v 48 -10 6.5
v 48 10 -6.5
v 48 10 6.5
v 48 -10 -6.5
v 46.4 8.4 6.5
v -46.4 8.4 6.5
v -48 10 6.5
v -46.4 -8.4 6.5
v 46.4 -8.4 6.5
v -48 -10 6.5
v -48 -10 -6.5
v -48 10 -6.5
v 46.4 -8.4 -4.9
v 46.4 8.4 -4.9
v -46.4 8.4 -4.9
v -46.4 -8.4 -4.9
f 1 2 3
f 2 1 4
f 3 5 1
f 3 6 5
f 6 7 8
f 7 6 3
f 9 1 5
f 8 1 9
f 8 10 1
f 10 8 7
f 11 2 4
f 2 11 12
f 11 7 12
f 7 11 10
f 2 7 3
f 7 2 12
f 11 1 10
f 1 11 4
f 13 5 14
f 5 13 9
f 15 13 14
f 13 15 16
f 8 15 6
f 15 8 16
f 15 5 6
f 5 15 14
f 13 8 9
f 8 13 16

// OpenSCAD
w=96;
h=13;
d=20;

t=1.6;

difference(){
    cube([w,d,h], true);  
    translate([0,0,t])  
    #cube([w-t*2,d-t*2,h],true);
}
